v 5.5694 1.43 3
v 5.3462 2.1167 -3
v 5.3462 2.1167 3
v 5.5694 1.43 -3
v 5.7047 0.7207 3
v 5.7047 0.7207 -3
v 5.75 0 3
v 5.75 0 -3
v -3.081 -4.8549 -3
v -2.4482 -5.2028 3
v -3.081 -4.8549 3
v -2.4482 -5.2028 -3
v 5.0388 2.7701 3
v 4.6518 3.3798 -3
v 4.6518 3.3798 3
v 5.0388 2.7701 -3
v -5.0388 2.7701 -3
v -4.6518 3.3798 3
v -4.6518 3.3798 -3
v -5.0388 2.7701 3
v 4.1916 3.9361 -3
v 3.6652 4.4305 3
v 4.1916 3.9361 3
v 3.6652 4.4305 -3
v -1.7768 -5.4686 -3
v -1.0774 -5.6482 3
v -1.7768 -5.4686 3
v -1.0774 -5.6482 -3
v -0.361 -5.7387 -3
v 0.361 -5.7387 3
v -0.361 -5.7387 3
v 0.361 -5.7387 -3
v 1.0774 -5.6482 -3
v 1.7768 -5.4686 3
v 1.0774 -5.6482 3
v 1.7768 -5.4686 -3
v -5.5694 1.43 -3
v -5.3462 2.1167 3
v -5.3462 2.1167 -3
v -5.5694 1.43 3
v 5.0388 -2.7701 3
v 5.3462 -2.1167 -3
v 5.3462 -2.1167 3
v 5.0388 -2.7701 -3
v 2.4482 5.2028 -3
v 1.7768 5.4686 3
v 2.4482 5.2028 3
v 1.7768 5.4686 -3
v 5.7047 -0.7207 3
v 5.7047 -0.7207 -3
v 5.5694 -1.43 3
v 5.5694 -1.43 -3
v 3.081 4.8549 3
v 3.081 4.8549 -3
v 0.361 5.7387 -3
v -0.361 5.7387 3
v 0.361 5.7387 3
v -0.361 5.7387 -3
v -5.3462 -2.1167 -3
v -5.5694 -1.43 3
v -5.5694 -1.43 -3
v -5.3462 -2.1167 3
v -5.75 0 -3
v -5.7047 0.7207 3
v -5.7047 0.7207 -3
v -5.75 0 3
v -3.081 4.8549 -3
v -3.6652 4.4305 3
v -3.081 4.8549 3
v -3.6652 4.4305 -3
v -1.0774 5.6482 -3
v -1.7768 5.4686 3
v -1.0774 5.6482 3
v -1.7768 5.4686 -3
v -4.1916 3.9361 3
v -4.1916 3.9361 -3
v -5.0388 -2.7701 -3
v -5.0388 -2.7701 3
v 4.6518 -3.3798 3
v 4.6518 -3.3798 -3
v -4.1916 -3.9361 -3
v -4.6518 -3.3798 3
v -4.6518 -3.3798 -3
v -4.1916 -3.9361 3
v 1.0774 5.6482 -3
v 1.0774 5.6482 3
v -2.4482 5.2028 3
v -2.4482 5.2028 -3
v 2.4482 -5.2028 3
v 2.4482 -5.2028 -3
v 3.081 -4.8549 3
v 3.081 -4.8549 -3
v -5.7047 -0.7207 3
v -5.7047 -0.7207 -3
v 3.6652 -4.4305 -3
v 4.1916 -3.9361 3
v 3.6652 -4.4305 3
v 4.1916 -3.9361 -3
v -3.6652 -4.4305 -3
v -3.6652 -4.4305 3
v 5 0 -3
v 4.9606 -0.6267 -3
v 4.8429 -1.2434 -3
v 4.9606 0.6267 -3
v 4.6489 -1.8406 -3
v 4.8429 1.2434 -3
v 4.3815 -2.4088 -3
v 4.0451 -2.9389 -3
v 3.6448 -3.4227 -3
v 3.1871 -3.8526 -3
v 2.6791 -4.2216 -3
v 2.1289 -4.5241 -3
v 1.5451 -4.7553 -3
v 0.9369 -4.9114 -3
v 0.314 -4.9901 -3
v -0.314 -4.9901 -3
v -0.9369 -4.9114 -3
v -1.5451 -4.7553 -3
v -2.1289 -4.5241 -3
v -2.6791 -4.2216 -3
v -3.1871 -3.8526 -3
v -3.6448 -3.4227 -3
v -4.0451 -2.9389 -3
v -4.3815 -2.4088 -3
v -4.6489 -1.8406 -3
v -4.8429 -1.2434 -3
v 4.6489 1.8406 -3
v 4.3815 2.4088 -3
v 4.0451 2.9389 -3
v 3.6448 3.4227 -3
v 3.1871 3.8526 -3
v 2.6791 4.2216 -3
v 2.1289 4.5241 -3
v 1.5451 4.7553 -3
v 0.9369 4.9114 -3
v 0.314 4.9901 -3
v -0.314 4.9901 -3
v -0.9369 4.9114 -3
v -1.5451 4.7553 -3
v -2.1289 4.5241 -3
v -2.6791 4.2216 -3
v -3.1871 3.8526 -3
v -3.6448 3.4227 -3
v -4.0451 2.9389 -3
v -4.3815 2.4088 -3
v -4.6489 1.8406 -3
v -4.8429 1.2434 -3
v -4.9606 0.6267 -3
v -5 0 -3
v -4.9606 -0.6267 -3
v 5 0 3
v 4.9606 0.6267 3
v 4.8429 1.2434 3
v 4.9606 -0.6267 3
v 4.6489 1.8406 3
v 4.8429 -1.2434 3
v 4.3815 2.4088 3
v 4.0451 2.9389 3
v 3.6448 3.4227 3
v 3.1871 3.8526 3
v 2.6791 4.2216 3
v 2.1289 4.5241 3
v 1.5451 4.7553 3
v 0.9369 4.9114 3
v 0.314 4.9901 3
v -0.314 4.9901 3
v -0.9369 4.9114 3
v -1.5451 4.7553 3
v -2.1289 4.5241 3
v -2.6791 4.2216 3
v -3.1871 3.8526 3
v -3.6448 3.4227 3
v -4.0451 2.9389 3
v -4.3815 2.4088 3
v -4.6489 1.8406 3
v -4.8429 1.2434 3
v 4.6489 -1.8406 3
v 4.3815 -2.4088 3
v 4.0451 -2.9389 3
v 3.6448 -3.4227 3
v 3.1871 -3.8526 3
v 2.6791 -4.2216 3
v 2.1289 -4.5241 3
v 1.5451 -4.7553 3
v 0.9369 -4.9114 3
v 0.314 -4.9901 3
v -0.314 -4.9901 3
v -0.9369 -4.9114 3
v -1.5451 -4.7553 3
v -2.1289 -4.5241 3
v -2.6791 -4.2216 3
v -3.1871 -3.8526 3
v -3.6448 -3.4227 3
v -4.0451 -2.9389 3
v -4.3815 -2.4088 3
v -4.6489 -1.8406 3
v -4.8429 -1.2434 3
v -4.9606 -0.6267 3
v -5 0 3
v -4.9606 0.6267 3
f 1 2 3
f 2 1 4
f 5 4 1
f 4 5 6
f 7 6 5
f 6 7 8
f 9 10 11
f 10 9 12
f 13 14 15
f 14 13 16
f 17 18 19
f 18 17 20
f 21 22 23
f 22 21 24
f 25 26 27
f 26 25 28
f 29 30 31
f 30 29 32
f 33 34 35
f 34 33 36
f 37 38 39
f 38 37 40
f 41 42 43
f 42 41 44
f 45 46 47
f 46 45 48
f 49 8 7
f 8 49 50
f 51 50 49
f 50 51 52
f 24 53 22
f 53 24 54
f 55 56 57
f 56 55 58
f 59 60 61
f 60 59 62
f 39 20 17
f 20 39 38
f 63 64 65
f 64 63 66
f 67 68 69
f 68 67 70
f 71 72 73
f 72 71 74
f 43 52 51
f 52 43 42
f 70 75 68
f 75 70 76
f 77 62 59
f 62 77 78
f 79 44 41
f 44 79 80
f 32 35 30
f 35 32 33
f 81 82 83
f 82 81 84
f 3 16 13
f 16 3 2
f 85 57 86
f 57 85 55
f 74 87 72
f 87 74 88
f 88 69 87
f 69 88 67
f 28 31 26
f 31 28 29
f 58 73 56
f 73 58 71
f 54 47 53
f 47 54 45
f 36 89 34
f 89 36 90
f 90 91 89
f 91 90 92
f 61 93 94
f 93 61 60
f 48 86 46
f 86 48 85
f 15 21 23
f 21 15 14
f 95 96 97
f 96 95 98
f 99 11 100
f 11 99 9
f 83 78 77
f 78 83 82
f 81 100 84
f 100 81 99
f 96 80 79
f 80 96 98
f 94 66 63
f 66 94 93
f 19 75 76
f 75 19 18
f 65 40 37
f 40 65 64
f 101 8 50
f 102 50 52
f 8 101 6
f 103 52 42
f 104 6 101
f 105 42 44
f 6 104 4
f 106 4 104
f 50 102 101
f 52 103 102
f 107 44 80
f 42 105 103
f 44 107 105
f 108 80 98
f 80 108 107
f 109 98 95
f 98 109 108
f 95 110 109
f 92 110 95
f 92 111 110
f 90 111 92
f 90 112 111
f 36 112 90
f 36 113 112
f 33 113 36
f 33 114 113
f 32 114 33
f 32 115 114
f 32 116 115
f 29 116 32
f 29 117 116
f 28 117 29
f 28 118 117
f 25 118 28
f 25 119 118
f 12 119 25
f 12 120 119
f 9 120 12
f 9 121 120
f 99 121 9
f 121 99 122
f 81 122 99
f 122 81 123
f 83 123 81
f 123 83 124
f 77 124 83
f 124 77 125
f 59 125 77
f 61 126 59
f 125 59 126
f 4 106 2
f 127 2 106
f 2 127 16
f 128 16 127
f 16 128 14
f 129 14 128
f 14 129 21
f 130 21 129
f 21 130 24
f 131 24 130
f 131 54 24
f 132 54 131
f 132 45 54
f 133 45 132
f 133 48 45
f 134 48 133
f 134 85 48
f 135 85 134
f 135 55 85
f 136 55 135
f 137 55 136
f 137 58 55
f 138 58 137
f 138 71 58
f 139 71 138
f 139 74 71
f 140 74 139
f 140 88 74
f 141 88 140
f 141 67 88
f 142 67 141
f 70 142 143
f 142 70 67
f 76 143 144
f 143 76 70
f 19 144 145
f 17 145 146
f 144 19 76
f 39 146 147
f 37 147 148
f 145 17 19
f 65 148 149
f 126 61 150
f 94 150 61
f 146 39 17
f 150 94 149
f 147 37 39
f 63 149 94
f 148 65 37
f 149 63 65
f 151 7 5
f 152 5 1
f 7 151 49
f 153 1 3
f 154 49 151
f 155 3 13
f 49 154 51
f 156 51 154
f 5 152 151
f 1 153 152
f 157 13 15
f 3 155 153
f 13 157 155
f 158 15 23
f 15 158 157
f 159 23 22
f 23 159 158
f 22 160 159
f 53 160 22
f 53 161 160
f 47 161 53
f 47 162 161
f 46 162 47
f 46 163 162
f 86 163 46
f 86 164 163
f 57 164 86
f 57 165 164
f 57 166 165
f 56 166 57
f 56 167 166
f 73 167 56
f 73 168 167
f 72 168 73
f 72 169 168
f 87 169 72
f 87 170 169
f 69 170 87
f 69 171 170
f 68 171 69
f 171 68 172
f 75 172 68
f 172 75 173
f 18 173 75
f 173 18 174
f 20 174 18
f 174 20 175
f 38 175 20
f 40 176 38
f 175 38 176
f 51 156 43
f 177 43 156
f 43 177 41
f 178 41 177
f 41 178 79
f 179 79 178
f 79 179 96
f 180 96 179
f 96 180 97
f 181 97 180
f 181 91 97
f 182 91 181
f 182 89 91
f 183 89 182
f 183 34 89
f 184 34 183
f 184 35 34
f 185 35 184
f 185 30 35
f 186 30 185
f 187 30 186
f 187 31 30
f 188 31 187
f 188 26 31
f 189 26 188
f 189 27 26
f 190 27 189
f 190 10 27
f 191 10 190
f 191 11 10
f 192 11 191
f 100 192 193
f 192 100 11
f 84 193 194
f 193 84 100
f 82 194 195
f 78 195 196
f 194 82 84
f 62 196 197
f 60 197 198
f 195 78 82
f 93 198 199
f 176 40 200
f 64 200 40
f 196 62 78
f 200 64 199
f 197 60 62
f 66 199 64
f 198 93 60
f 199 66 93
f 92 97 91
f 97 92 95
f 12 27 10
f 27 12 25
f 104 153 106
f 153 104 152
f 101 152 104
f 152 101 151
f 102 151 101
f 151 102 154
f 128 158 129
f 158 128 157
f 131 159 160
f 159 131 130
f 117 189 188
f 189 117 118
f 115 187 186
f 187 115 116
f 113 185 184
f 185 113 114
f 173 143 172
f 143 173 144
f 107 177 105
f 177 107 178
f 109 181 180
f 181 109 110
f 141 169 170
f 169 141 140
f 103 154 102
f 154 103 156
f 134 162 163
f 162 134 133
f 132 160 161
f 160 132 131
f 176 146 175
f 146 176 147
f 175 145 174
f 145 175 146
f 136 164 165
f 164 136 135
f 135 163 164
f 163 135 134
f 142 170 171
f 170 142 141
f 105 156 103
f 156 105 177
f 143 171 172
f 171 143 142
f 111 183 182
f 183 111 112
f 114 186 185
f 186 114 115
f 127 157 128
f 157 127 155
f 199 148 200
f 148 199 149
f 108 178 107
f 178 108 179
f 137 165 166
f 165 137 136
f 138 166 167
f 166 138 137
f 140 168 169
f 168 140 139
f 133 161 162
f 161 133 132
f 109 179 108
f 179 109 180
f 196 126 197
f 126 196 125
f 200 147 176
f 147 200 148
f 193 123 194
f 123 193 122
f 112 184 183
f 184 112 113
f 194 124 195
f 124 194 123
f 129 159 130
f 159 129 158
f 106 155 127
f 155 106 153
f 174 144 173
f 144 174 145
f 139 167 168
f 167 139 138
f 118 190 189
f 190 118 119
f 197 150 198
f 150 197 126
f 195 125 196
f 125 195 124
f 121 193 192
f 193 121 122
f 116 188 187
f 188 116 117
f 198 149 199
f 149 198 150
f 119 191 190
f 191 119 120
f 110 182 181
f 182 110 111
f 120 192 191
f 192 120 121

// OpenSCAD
$fn = 50;


difference() {
	union() {
		translate(v = [0, 0, -3.0000000000]) {
			cylinder(h = 6, r = 5.7500000000);
		}
	}
	union() {
		translate(v = [0, 0, -100.0000000000]) {
			cylinder(h = 200, r = 5.0000000000);
		}
	}
}
